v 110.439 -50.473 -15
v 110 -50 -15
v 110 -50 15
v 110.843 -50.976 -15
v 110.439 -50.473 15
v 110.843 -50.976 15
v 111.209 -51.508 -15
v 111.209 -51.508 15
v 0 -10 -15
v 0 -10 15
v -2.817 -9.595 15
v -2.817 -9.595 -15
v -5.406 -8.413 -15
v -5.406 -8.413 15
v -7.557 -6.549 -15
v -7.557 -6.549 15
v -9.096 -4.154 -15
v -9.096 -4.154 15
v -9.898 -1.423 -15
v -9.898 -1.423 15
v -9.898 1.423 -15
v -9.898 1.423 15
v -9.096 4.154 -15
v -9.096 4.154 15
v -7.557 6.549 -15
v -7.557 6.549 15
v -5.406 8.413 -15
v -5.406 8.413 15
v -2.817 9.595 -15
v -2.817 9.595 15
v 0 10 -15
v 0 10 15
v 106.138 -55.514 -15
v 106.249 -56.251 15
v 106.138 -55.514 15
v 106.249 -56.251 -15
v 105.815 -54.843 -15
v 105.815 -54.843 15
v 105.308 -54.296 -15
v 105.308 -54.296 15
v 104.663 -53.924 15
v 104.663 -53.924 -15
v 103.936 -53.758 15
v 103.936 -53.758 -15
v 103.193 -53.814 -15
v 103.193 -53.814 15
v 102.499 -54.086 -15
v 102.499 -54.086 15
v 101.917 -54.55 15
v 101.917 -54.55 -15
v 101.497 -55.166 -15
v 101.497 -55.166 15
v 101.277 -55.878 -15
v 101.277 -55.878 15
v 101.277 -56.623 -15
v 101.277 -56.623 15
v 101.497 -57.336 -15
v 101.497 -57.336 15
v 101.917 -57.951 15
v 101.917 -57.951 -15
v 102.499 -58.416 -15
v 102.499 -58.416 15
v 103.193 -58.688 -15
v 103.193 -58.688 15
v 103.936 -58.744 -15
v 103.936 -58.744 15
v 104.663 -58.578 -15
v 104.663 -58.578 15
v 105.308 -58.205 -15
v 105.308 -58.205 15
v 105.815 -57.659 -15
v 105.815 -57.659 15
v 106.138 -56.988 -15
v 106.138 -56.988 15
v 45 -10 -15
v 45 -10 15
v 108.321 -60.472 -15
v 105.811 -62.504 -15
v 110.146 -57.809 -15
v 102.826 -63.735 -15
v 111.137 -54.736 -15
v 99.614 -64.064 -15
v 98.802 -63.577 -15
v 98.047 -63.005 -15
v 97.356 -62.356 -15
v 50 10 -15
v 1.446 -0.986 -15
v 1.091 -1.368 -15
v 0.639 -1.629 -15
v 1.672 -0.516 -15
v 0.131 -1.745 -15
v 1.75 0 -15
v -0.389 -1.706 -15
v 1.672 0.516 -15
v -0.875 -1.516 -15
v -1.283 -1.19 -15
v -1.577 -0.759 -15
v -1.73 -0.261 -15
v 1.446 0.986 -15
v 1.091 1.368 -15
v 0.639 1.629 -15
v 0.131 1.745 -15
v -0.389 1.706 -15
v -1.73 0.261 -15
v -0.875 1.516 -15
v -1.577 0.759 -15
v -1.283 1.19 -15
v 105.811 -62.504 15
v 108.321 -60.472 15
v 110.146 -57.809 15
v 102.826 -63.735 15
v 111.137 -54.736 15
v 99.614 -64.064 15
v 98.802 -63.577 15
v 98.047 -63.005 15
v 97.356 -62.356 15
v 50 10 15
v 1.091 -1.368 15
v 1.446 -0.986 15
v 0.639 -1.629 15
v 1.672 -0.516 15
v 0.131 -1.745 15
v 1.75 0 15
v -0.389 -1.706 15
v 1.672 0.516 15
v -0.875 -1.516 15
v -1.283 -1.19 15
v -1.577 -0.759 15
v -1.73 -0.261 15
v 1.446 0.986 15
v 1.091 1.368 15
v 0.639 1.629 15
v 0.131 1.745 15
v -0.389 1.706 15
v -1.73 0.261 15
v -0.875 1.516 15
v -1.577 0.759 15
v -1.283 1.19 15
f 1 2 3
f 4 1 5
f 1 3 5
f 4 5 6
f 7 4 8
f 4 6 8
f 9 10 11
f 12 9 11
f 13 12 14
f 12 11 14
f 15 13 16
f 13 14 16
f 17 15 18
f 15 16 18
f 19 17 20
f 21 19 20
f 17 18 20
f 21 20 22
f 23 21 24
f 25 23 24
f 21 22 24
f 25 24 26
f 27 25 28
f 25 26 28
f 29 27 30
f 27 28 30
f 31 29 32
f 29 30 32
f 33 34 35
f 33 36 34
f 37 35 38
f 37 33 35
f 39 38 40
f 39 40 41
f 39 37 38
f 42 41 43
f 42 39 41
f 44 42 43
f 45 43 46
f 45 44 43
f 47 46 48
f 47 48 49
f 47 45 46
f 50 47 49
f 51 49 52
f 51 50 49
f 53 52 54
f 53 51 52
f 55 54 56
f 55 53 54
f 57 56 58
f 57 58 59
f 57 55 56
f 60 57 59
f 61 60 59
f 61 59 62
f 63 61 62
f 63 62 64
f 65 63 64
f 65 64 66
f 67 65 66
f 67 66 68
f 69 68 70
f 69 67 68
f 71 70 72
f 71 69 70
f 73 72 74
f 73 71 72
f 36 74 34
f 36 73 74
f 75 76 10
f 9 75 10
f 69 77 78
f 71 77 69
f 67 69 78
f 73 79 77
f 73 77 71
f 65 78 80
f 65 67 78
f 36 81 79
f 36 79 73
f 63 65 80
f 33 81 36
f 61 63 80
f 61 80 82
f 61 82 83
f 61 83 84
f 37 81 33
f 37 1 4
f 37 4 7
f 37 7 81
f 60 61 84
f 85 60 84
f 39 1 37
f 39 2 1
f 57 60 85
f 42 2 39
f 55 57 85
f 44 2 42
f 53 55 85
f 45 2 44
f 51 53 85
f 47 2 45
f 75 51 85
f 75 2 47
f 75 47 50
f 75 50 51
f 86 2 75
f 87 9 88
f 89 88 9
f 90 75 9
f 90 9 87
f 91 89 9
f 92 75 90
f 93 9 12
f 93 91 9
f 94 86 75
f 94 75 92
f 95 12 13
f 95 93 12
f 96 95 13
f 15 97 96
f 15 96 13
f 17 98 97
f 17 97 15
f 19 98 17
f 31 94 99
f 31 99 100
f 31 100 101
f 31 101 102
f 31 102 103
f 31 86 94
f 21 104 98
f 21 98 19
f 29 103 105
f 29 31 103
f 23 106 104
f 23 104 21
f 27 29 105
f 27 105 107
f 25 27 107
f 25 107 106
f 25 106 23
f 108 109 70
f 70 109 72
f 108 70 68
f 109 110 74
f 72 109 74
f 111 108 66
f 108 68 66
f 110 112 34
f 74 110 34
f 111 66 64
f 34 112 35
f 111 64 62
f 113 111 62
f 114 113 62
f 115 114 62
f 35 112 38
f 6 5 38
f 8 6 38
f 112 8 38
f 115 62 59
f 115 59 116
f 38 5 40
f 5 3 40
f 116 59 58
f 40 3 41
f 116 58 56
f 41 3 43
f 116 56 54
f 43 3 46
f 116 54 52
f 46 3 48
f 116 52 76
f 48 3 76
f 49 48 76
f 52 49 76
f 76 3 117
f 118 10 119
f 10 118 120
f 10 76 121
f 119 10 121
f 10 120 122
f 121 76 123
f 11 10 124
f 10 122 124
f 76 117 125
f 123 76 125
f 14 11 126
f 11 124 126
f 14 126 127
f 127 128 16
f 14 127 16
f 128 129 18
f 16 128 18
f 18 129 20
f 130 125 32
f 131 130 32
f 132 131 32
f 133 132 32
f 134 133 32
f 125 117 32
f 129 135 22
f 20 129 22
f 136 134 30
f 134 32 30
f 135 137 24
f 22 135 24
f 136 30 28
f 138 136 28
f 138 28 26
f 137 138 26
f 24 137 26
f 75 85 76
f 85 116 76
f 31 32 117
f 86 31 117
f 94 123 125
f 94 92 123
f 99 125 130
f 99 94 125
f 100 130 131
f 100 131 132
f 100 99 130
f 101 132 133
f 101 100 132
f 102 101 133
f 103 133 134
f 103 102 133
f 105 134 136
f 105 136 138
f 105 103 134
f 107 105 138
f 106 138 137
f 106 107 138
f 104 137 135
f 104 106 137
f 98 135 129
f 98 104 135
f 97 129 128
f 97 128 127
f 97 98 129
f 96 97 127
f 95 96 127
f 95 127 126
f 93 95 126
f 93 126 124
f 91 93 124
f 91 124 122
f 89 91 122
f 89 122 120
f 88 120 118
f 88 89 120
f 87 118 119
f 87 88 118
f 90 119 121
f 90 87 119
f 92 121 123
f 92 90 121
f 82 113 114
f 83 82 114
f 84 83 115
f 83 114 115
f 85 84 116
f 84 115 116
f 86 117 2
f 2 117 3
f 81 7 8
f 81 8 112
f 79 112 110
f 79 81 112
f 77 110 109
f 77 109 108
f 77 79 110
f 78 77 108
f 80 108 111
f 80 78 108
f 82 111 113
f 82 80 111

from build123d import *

# Parameters (mm, degrees)
SKETCH2_R           = 1.75
SKETCH2_R_2         = 2.5
BOSS_EXTRUDE1_DEPTH = 15
SPLIT1_START        = -15
SPLIT1_DEPTH        = 30


# Read off the part's stored shape, not the designer's step: Split1
with BuildPart() as part:
    # Sketch2 → Boss-Extrude1 (new, symmetric)
    with BuildSketch(Plane.XY):
        with BuildLine():
            Line((0, 10), (50, 10))
            Line((50, 10), (110, -50))
            ThreePointArc((110, -50), (109.927822148, -62.57300177), (97.356477729, -62.356477729))
            Line((97.356477729, -62.356477729), (45, -10))
            Line((45, -10), (0, -10))
            ThreePointArc((0, -10), (-10, 0), (0, 10))
        make_face()
        Circle(SKETCH2_R, mode=Mode.SUBTRACT)
        with Locations((103.749176054, -56.250823946)):
            Circle(SKETCH2_R_2, mode=Mode.SUBTRACT)
    extrude(amount=BOSS_EXTRUDE1_DEPTH, both=True)

    # Split1 outline → Split1 (cut)
    with BuildSketch(Plane.XY.offset(SPLIT1_START)):
        with BuildLine():
            ThreePointArc((111.20911577, -51.507945133), (108.320634217, -60.472229721), (99.61434242, -64.06419395))
            ThreePointArc((99.61434242, -64.06419395), (110.24370673, -62.248045911), (111.20911577, -51.507945133))
        make_face()
    extrude(amount=SPLIT1_DEPTH, mode=Mode.SUBTRACT)


solid = part.part
